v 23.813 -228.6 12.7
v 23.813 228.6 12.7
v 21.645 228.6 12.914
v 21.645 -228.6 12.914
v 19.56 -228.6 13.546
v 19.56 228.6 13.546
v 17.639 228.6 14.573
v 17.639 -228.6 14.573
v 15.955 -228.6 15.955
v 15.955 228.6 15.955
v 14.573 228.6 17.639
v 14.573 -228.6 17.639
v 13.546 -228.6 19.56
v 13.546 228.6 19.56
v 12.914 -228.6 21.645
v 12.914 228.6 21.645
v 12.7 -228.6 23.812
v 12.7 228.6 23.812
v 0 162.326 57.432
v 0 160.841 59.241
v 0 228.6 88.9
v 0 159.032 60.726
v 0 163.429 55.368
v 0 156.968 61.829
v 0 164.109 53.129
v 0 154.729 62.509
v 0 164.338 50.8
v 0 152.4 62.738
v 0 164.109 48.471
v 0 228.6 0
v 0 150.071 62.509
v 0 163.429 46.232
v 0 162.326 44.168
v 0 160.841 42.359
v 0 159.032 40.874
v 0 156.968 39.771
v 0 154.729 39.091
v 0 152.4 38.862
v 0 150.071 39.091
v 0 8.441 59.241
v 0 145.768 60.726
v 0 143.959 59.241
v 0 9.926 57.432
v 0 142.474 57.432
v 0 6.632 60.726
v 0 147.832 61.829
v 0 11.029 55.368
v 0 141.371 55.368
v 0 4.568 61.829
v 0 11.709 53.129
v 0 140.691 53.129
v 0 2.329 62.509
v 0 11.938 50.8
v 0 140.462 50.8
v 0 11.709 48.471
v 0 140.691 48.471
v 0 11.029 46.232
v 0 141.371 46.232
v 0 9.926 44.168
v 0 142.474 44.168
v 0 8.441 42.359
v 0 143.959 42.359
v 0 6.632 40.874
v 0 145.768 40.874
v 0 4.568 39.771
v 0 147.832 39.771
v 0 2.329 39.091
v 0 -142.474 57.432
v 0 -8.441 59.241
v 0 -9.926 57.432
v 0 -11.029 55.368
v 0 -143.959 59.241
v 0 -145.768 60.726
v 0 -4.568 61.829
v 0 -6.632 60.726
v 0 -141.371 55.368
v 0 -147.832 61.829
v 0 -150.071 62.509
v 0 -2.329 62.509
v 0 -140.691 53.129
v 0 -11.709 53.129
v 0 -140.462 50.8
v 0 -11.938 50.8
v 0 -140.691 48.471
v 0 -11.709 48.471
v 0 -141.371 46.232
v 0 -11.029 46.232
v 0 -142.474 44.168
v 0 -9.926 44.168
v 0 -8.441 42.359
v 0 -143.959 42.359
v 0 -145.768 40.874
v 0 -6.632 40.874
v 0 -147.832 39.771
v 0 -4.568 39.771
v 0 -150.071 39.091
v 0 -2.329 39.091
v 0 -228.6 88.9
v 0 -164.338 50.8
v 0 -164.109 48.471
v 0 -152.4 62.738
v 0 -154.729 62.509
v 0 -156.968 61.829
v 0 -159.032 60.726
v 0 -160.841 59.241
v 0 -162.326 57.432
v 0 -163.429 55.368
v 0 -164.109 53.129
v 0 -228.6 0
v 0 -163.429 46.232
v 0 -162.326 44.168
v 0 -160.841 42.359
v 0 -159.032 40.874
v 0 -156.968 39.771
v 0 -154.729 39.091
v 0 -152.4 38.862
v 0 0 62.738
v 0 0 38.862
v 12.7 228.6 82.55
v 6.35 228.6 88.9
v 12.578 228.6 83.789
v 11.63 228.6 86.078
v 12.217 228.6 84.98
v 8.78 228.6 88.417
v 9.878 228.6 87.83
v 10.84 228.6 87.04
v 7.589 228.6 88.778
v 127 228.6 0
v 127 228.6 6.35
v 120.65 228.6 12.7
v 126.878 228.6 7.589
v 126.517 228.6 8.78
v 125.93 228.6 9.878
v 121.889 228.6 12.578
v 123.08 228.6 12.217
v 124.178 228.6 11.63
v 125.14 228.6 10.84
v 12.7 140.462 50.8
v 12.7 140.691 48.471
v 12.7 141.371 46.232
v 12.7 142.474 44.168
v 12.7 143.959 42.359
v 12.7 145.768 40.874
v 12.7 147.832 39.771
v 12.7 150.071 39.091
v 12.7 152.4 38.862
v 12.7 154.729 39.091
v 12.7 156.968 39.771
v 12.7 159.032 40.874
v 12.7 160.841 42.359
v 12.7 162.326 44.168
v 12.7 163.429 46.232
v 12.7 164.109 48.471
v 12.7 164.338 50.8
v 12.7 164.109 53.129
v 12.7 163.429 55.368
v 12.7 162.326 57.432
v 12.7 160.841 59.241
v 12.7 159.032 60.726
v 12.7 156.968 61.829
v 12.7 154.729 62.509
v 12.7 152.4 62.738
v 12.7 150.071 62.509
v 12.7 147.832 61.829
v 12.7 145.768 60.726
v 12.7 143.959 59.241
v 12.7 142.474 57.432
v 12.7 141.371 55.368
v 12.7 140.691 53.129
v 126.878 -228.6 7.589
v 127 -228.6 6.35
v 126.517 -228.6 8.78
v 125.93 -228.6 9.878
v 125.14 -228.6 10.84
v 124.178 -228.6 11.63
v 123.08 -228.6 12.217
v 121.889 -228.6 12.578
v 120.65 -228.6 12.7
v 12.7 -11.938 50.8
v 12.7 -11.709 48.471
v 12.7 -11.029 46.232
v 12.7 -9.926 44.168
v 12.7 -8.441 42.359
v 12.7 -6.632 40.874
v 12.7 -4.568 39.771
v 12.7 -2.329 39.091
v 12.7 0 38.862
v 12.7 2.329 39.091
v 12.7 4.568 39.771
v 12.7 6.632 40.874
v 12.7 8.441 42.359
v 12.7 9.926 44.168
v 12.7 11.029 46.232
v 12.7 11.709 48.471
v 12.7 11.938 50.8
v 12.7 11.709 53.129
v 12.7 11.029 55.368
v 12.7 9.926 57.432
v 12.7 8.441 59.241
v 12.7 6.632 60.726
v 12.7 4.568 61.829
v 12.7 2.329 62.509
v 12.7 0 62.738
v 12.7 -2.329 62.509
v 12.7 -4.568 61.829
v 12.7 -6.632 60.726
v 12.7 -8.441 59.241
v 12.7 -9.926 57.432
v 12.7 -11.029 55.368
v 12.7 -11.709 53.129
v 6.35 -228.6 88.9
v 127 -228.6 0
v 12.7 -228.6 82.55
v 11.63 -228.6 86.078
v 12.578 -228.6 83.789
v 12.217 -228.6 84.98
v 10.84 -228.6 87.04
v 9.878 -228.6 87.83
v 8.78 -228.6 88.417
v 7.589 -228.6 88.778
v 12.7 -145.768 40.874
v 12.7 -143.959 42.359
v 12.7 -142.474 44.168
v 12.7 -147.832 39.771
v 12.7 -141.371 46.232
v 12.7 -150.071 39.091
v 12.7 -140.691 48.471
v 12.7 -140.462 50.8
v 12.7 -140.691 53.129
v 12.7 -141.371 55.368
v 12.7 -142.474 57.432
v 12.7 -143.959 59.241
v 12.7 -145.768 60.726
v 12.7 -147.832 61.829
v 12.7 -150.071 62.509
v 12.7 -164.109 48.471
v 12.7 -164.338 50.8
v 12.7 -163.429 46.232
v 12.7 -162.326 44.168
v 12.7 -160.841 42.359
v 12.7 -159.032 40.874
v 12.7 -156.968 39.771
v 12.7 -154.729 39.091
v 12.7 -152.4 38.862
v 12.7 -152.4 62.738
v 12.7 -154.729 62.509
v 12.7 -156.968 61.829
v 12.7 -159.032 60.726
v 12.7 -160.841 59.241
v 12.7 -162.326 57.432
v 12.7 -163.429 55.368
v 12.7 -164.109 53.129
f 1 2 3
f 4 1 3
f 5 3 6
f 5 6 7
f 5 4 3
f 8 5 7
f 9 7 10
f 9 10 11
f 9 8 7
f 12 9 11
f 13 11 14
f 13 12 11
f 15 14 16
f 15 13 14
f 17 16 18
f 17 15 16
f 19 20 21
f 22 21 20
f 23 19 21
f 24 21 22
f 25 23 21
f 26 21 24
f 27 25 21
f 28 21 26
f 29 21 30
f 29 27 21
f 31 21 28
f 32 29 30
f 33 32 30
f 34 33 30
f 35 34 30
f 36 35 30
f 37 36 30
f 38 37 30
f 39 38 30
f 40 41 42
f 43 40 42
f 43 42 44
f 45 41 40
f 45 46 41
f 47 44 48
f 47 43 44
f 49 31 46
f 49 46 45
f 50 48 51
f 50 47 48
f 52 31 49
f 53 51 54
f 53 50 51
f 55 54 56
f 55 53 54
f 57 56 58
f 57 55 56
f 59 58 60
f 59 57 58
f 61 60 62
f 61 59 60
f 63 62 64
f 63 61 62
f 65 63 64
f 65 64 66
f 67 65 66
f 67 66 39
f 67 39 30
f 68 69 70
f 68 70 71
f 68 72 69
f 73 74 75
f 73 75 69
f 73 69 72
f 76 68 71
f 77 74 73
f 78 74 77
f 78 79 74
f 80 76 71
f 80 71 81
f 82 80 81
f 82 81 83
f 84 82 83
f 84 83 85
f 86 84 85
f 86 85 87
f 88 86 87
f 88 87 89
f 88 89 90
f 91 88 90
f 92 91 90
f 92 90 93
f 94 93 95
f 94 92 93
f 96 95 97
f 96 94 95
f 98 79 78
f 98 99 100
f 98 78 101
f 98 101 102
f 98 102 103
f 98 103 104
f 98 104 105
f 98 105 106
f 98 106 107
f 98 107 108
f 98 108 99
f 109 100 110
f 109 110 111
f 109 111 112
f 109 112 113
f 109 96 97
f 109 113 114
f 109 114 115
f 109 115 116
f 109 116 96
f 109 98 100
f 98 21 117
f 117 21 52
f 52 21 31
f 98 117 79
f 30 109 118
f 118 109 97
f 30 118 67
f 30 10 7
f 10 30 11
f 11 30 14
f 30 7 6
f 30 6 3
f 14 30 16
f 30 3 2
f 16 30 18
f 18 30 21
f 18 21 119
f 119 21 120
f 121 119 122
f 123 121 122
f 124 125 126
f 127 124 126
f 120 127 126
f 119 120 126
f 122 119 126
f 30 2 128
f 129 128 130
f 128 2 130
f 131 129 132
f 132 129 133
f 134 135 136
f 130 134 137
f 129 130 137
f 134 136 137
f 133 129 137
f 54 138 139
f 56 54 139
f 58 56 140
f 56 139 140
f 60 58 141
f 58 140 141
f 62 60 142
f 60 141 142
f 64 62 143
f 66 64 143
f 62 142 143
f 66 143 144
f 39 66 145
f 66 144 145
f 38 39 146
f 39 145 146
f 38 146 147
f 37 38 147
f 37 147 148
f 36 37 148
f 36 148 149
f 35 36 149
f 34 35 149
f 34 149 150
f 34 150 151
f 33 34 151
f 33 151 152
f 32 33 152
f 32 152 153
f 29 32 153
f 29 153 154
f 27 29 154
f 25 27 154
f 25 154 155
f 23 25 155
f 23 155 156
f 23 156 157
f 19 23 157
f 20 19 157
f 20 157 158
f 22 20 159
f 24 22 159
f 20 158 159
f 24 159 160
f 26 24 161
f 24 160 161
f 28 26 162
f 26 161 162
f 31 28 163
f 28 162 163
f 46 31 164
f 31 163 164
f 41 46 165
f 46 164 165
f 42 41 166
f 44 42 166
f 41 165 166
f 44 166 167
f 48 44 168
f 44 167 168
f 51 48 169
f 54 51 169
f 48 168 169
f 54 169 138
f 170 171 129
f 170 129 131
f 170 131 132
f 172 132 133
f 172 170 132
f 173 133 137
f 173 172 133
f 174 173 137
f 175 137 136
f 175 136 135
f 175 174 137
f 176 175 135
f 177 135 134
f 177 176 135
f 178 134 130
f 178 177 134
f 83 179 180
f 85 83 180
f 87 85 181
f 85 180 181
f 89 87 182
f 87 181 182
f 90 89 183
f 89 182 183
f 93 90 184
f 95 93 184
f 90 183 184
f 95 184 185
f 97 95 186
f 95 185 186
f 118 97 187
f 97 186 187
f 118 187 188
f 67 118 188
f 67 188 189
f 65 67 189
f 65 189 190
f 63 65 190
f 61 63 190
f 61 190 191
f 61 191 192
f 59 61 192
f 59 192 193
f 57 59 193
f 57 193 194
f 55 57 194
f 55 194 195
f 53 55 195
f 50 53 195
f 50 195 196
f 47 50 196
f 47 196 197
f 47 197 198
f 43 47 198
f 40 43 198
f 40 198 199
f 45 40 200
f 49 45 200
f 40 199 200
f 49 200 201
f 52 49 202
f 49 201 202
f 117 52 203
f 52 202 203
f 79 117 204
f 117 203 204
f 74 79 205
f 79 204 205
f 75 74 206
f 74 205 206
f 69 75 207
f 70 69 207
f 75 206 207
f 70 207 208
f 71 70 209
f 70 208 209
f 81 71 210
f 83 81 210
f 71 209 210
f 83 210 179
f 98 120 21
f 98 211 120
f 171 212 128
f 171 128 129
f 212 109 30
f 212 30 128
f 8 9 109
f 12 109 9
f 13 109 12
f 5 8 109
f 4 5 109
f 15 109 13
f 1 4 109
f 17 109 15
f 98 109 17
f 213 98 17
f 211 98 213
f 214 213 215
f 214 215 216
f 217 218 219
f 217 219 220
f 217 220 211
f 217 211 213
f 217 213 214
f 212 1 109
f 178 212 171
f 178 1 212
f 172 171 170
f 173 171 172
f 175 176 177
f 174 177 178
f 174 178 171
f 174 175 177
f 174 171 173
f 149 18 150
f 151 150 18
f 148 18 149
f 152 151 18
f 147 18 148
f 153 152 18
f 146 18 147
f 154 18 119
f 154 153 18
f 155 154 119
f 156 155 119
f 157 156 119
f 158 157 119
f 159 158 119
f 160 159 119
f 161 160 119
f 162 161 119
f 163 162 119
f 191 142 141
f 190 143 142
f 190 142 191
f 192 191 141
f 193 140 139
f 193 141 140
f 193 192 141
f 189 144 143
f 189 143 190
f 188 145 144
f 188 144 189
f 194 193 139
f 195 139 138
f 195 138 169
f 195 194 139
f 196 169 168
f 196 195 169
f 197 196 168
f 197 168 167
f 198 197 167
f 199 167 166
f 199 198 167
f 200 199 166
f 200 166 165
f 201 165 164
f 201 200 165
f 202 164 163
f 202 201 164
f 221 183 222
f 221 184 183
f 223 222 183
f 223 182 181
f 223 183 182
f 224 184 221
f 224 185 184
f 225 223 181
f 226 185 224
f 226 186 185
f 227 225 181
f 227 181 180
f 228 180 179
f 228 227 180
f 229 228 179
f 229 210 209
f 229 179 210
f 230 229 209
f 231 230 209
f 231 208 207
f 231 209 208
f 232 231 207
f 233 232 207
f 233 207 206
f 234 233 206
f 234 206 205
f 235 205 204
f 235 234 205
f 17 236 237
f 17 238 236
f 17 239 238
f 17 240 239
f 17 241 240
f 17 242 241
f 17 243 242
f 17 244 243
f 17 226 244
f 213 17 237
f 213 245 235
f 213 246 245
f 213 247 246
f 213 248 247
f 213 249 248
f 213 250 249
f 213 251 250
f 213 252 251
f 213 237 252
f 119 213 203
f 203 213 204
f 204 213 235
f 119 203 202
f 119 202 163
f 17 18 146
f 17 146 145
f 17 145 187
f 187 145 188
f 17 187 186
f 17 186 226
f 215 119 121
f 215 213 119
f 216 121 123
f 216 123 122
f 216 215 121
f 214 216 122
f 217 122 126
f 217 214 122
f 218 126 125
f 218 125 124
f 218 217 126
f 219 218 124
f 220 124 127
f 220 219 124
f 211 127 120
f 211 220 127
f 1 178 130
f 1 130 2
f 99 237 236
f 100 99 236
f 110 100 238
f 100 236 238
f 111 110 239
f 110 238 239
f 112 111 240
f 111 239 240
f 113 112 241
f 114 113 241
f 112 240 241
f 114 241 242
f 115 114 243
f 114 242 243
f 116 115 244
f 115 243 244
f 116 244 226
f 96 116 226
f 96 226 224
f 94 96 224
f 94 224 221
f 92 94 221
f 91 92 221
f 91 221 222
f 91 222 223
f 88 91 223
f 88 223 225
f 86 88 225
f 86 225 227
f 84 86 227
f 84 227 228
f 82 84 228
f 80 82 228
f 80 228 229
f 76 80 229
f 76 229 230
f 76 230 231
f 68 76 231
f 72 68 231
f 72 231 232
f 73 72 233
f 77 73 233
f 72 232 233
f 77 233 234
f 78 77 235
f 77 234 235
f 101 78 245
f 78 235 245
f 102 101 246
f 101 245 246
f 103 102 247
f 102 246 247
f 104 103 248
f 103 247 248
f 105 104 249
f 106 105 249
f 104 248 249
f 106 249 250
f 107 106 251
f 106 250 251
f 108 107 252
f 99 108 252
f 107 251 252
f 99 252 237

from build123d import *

# Parameters (mm, degrees)
F1_DEPTH = 228.6
F3_D     = 23.876


with BuildPart() as f1:
    # F0 (on Front) → F1 (new body, symmetric)
    with BuildSketch(Plane.XZ):
        with BuildLine():
            Line((6.3500000013, 88.9), (0, 88.9))
            Line((0, 88.9), (0, 0))
            Line((0, 0), (127, 0))
            Line((127, 0), (127, 6.35))
            ThreePointArc((127, 6.35), (125.1401280605, 10.8401280605), (120.65, 12.7))
            Line((120.65, 12.7), (23.8125000013, 12.7))
            ThreePointArc((23.8125000013, 12.7), (15.9547758954, 15.9547758941), (12.7000000013, 23.8125))
            Line((12.7000000013, 23.8125), (12.7000000013, 82.55))
            ThreePointArc((12.7000000013, 82.55), (10.8401280618, 87.0401280605), (6.3500000013, 88.9))
        make_face()
    extrude(amount=F1_DEPTH, both=True)

    # F3 (through all)
    with Locations(Plane(origin=(0, 0, 0), x_dir=(0, 1, 0), z_dir=(-1, 0, 0))):
        with Locations((-152.4, -50.8), (0, -50.8), (152.4, -50.8)):
            Hole(F3_D / 2)


solid = f1.part
